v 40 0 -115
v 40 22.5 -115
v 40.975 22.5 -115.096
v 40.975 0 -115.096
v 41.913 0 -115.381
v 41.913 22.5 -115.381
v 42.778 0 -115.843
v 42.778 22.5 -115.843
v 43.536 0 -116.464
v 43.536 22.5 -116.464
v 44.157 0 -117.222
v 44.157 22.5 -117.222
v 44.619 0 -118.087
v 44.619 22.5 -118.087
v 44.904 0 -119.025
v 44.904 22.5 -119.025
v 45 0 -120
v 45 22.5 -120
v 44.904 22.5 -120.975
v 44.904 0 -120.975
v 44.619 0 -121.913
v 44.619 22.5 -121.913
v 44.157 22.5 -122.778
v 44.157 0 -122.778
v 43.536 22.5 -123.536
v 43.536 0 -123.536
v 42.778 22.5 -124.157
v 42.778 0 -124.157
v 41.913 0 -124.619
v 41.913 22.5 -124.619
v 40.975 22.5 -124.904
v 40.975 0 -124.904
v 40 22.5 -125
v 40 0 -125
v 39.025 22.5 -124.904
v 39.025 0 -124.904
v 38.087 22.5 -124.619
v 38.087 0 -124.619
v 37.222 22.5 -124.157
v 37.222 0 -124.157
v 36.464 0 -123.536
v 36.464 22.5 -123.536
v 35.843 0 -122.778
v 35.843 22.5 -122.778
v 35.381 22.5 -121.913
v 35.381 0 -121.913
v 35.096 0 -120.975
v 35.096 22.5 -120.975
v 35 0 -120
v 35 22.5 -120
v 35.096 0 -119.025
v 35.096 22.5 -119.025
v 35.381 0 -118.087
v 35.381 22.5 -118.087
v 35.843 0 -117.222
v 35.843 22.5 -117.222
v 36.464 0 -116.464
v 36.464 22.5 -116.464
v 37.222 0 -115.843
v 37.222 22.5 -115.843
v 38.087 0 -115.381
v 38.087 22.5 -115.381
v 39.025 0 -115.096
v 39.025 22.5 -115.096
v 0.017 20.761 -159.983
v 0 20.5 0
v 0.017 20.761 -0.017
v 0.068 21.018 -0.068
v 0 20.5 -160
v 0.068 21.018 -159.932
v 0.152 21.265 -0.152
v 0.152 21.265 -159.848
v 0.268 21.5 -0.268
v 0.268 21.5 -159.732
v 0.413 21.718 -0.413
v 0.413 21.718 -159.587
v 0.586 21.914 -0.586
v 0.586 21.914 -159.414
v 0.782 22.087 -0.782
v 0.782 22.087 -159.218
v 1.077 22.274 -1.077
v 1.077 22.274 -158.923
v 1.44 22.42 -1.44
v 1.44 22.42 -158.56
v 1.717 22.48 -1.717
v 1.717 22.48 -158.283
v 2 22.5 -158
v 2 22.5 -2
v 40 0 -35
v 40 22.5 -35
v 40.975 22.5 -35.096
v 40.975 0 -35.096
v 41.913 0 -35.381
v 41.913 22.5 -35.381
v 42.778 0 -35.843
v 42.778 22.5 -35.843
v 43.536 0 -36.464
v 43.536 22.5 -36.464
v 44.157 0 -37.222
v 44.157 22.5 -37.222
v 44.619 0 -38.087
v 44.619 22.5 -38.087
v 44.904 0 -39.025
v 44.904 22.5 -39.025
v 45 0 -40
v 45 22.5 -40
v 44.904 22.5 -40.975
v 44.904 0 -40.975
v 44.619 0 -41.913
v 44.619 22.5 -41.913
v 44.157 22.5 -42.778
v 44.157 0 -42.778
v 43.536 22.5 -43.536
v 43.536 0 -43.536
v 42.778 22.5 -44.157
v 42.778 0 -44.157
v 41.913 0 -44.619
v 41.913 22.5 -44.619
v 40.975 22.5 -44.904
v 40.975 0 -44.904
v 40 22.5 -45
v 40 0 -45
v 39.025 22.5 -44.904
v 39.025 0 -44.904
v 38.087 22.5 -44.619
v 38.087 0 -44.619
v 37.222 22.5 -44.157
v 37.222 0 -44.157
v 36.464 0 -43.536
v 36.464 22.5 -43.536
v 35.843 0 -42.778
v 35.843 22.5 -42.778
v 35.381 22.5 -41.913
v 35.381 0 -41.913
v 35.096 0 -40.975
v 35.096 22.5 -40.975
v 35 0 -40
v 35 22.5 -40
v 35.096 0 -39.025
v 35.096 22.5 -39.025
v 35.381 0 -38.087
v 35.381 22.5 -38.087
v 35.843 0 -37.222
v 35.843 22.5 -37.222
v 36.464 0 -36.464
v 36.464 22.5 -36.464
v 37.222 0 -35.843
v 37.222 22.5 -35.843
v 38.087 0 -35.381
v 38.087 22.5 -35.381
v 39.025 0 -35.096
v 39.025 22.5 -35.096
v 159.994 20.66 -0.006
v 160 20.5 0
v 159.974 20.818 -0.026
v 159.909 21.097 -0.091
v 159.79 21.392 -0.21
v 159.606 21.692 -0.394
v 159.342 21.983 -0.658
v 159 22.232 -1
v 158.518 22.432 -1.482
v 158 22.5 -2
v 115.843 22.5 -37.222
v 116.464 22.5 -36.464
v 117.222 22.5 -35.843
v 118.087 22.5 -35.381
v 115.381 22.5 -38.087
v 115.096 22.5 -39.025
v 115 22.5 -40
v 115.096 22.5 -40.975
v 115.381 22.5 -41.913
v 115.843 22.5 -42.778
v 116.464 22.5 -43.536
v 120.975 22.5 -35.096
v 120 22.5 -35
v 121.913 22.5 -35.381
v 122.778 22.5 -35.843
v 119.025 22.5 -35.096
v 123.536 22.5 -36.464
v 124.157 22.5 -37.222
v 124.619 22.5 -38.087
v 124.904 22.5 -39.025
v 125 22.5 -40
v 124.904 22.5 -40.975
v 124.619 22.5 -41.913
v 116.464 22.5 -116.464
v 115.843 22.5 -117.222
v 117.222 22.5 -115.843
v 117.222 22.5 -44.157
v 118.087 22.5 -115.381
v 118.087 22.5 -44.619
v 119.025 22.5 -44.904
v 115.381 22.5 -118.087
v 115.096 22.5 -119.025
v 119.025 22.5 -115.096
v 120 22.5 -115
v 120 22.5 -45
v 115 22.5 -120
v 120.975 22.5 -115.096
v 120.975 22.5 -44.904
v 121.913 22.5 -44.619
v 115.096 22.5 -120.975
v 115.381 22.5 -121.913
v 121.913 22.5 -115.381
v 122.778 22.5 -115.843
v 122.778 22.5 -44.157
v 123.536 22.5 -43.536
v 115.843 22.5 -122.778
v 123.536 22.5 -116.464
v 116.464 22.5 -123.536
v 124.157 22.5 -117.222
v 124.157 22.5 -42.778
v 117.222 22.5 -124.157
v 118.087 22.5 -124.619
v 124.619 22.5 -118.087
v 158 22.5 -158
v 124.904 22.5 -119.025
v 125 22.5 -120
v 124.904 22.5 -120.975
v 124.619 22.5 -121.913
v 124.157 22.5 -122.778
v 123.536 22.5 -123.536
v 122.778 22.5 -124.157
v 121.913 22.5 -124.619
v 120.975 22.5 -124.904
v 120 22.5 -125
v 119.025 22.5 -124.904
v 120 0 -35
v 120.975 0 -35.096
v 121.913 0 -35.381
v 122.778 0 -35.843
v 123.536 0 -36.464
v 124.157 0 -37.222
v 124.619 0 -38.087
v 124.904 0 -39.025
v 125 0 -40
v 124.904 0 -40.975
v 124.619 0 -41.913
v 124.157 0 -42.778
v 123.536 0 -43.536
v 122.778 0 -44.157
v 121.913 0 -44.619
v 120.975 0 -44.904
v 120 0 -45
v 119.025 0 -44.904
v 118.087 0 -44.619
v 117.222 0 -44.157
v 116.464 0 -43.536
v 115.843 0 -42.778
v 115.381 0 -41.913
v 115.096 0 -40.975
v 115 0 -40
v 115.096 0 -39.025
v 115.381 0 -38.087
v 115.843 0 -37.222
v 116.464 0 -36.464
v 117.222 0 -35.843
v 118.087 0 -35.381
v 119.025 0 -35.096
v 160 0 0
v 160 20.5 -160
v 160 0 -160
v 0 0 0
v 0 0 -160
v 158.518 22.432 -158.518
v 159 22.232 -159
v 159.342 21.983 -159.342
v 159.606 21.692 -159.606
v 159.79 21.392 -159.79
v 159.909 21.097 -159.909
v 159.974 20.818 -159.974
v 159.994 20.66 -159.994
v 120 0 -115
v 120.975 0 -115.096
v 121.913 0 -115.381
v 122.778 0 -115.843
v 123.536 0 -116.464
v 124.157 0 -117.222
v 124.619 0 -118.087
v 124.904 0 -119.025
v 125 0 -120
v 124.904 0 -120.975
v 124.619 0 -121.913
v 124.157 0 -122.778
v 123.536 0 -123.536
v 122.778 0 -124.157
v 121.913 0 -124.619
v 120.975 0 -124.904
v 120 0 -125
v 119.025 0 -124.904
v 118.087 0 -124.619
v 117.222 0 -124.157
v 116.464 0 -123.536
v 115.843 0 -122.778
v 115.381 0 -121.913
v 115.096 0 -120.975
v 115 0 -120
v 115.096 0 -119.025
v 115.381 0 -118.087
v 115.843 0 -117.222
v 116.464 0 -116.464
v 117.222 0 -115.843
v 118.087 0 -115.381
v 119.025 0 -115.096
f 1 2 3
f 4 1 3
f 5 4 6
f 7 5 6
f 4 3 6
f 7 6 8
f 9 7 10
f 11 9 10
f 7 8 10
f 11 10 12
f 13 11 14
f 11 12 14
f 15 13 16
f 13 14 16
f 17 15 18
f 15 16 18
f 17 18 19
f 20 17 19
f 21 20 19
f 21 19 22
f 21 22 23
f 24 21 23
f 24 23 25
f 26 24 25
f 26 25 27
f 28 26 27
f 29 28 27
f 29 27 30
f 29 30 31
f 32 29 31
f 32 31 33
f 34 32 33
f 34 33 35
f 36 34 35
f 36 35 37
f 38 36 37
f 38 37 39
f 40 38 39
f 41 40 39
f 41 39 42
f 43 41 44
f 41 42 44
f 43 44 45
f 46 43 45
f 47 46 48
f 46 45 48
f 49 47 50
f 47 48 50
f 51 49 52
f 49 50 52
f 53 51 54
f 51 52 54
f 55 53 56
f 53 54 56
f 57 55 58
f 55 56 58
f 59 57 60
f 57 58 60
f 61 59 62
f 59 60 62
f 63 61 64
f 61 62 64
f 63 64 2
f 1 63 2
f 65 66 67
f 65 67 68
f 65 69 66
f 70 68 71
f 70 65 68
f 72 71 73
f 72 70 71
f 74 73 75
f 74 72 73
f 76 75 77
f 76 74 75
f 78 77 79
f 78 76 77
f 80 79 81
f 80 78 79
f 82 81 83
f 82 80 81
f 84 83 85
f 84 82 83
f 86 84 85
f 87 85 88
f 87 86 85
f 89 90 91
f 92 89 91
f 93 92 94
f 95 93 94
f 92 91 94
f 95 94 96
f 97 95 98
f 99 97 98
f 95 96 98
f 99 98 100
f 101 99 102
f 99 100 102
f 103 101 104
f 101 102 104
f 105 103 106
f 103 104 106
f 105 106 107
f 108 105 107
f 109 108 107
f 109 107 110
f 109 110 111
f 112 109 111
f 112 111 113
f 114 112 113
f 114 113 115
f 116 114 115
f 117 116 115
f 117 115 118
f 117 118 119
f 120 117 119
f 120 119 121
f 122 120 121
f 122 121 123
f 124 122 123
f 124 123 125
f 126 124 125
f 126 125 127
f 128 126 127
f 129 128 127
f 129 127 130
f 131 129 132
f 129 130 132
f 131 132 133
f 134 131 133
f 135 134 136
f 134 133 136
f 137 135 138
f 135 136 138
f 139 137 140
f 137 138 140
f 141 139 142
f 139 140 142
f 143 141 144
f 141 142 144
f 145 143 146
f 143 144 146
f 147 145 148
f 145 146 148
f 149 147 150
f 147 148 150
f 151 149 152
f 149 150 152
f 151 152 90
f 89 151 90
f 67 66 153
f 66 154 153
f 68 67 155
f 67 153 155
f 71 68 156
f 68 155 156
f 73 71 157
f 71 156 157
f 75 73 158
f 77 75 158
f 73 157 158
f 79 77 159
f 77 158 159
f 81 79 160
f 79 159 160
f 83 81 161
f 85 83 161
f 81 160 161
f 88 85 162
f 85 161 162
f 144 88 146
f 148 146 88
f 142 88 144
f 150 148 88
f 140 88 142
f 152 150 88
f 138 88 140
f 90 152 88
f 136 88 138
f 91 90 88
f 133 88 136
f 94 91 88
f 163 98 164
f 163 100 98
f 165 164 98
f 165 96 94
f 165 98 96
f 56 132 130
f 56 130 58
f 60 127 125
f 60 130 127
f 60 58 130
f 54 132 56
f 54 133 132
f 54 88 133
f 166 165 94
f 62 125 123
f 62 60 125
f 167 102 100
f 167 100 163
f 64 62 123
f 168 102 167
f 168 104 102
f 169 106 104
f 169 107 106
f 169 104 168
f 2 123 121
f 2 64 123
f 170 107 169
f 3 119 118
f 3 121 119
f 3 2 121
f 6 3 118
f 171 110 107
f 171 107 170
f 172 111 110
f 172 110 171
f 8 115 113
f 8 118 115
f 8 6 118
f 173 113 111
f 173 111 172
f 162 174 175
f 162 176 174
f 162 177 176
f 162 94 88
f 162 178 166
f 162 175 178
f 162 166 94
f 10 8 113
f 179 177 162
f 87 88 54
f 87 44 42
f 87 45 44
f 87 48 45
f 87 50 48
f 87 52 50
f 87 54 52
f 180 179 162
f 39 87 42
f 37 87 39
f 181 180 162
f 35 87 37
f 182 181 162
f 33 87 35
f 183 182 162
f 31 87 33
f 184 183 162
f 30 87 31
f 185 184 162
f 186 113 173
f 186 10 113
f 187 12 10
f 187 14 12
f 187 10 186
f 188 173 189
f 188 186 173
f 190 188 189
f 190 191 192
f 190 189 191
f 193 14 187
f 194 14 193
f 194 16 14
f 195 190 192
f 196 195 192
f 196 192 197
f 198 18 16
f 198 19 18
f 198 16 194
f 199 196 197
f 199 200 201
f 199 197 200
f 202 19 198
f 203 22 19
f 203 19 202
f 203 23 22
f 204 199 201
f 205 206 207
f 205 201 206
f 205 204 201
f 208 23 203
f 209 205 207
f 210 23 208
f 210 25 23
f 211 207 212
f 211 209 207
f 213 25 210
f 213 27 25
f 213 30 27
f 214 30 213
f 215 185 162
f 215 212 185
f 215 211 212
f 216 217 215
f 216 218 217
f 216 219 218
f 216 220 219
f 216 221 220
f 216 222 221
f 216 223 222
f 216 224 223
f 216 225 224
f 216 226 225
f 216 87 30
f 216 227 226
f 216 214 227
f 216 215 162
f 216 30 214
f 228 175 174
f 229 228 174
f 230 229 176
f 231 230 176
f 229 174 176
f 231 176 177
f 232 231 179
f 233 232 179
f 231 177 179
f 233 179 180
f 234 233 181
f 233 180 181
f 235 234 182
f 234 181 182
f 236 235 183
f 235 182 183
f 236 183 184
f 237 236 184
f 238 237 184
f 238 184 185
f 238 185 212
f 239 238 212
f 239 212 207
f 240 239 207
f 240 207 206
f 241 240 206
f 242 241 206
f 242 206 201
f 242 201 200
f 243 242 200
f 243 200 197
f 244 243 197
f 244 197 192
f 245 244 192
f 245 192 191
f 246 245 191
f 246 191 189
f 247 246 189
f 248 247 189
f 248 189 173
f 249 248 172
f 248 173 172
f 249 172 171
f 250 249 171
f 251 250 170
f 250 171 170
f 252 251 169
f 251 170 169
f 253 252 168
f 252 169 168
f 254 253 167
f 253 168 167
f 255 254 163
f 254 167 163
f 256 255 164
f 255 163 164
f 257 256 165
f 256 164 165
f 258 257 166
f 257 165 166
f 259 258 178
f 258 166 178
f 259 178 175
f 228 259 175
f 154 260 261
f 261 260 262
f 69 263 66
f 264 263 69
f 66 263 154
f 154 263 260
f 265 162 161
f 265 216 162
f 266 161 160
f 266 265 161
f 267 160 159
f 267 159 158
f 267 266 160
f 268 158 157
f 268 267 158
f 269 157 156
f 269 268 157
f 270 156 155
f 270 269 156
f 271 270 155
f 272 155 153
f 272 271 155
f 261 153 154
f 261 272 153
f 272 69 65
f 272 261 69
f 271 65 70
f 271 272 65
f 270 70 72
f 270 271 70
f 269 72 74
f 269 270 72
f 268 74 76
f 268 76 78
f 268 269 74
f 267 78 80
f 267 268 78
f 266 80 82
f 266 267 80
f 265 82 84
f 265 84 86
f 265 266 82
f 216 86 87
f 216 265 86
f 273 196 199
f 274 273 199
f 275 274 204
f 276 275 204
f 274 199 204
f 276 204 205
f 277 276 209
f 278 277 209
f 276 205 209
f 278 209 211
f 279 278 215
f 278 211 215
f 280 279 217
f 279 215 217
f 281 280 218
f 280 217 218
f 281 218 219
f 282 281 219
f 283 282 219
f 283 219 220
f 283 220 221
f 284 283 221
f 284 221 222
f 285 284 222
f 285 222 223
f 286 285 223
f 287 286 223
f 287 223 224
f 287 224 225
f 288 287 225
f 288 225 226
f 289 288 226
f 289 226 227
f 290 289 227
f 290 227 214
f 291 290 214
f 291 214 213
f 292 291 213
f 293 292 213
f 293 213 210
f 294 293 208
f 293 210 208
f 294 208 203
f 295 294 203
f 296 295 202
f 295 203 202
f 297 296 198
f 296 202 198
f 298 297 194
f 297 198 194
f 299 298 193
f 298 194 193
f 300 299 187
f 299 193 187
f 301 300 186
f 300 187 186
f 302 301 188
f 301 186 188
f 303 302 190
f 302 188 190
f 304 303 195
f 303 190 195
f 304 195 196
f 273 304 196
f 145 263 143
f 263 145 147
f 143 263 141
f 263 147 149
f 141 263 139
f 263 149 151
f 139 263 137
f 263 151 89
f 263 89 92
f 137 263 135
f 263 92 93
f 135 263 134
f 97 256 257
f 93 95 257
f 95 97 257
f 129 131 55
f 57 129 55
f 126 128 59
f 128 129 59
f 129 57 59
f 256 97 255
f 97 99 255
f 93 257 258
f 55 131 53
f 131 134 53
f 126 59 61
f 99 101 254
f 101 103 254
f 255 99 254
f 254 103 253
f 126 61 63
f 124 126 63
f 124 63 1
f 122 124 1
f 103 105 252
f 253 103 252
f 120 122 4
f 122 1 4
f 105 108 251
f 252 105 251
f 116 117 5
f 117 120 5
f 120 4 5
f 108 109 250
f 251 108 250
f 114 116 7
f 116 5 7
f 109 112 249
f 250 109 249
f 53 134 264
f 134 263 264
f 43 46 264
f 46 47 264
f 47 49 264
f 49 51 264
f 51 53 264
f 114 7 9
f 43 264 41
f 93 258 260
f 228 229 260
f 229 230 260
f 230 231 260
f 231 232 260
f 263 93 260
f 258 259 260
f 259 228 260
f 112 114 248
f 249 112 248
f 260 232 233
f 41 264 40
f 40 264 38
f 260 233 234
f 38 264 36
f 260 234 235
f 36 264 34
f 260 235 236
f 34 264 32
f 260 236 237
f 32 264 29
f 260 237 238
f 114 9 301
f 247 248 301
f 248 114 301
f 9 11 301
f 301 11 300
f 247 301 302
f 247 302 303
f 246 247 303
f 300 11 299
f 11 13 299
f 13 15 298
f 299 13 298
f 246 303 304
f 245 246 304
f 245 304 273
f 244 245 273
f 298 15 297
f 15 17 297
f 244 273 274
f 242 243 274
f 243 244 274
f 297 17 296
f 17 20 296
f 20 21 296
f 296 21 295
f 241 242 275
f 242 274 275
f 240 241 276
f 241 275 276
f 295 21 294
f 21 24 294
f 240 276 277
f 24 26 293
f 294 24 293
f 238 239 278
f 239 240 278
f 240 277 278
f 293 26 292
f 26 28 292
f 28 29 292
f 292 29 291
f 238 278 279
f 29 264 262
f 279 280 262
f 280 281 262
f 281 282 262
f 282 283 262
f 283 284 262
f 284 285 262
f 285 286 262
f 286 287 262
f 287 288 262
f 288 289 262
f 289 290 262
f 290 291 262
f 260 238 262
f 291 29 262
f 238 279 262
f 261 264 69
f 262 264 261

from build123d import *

# Parameters (mm, degrees)
SKETCH_1_W                  = 160
SKETCH_1_H                  = 160
EXTRUDE_1_DEPTH             = 22.5
SKETCH_2_R                  = 5
CUT_EXTRUDE_1_DEPTH         = 228.390083337
PATTERN_LINEAR_1_COUNT      = 2
PATTERN_LINEAR_1_PITCH      = 80
PATTERN_LINEAR_1_COUNT_DIR2 = 2
PATTERN_LINEAR_1_PITCH_DIR2 = 80
FILLET_2_R                  = 2


with BuildPart() as part:
    # 草图1 → 凸台-拉伸1 (new body)
    with BuildSketch(Plane(origin=(0, 0, 0), x_dir=(1, 0, 0), z_dir=(0, 1, 0))):
        with Locations((80, 80)):
            Rectangle(SKETCH_1_W, SKETCH_1_H)
    extrude(amount=EXTRUDE_1_DEPTH)

    # 草图2 → 切除-拉伸1 (cut, through all)
    with BuildSketch(Plane(origin=(0, 22.5, 0), x_dir=(1, 0, 0), z_dir=(0, 1, 0))):
        with Locations(Location((40, 120, 0), (0, 0, 270))):
            Circle(SKETCH_2_R)
    cut_extrude_1 = extrude(amount=-CUT_EXTRUDE_1_DEPTH, mode=Mode.SUBTRACT)

    # 阵列(线性)1: Cut-Extrude 1 2 × 2
    with Locations(*[(i * PATTERN_LINEAR_1_PITCH, 0, j * PATTERN_LINEAR_1_PITCH_DIR2) for i in range(PATTERN_LINEAR_1_COUNT) for j in range(PATTERN_LINEAR_1_COUNT_DIR2) if (i, j) != (0, 0)]):
        add(cut_extrude_1, mode=Mode.SUBTRACT)

    # 圆角2
    fillet_2_edges = [part.edges().sort_by_distance(p)[0] for p in [
        (160, 22.5, -80),
        (80, 22.5, -160),
        (0, 22.5, -80),
        (80, 22.5, 0),
    ]]
    fillet(fillet_2_edges, radius=FILLET_2_R)


solid = part.part
